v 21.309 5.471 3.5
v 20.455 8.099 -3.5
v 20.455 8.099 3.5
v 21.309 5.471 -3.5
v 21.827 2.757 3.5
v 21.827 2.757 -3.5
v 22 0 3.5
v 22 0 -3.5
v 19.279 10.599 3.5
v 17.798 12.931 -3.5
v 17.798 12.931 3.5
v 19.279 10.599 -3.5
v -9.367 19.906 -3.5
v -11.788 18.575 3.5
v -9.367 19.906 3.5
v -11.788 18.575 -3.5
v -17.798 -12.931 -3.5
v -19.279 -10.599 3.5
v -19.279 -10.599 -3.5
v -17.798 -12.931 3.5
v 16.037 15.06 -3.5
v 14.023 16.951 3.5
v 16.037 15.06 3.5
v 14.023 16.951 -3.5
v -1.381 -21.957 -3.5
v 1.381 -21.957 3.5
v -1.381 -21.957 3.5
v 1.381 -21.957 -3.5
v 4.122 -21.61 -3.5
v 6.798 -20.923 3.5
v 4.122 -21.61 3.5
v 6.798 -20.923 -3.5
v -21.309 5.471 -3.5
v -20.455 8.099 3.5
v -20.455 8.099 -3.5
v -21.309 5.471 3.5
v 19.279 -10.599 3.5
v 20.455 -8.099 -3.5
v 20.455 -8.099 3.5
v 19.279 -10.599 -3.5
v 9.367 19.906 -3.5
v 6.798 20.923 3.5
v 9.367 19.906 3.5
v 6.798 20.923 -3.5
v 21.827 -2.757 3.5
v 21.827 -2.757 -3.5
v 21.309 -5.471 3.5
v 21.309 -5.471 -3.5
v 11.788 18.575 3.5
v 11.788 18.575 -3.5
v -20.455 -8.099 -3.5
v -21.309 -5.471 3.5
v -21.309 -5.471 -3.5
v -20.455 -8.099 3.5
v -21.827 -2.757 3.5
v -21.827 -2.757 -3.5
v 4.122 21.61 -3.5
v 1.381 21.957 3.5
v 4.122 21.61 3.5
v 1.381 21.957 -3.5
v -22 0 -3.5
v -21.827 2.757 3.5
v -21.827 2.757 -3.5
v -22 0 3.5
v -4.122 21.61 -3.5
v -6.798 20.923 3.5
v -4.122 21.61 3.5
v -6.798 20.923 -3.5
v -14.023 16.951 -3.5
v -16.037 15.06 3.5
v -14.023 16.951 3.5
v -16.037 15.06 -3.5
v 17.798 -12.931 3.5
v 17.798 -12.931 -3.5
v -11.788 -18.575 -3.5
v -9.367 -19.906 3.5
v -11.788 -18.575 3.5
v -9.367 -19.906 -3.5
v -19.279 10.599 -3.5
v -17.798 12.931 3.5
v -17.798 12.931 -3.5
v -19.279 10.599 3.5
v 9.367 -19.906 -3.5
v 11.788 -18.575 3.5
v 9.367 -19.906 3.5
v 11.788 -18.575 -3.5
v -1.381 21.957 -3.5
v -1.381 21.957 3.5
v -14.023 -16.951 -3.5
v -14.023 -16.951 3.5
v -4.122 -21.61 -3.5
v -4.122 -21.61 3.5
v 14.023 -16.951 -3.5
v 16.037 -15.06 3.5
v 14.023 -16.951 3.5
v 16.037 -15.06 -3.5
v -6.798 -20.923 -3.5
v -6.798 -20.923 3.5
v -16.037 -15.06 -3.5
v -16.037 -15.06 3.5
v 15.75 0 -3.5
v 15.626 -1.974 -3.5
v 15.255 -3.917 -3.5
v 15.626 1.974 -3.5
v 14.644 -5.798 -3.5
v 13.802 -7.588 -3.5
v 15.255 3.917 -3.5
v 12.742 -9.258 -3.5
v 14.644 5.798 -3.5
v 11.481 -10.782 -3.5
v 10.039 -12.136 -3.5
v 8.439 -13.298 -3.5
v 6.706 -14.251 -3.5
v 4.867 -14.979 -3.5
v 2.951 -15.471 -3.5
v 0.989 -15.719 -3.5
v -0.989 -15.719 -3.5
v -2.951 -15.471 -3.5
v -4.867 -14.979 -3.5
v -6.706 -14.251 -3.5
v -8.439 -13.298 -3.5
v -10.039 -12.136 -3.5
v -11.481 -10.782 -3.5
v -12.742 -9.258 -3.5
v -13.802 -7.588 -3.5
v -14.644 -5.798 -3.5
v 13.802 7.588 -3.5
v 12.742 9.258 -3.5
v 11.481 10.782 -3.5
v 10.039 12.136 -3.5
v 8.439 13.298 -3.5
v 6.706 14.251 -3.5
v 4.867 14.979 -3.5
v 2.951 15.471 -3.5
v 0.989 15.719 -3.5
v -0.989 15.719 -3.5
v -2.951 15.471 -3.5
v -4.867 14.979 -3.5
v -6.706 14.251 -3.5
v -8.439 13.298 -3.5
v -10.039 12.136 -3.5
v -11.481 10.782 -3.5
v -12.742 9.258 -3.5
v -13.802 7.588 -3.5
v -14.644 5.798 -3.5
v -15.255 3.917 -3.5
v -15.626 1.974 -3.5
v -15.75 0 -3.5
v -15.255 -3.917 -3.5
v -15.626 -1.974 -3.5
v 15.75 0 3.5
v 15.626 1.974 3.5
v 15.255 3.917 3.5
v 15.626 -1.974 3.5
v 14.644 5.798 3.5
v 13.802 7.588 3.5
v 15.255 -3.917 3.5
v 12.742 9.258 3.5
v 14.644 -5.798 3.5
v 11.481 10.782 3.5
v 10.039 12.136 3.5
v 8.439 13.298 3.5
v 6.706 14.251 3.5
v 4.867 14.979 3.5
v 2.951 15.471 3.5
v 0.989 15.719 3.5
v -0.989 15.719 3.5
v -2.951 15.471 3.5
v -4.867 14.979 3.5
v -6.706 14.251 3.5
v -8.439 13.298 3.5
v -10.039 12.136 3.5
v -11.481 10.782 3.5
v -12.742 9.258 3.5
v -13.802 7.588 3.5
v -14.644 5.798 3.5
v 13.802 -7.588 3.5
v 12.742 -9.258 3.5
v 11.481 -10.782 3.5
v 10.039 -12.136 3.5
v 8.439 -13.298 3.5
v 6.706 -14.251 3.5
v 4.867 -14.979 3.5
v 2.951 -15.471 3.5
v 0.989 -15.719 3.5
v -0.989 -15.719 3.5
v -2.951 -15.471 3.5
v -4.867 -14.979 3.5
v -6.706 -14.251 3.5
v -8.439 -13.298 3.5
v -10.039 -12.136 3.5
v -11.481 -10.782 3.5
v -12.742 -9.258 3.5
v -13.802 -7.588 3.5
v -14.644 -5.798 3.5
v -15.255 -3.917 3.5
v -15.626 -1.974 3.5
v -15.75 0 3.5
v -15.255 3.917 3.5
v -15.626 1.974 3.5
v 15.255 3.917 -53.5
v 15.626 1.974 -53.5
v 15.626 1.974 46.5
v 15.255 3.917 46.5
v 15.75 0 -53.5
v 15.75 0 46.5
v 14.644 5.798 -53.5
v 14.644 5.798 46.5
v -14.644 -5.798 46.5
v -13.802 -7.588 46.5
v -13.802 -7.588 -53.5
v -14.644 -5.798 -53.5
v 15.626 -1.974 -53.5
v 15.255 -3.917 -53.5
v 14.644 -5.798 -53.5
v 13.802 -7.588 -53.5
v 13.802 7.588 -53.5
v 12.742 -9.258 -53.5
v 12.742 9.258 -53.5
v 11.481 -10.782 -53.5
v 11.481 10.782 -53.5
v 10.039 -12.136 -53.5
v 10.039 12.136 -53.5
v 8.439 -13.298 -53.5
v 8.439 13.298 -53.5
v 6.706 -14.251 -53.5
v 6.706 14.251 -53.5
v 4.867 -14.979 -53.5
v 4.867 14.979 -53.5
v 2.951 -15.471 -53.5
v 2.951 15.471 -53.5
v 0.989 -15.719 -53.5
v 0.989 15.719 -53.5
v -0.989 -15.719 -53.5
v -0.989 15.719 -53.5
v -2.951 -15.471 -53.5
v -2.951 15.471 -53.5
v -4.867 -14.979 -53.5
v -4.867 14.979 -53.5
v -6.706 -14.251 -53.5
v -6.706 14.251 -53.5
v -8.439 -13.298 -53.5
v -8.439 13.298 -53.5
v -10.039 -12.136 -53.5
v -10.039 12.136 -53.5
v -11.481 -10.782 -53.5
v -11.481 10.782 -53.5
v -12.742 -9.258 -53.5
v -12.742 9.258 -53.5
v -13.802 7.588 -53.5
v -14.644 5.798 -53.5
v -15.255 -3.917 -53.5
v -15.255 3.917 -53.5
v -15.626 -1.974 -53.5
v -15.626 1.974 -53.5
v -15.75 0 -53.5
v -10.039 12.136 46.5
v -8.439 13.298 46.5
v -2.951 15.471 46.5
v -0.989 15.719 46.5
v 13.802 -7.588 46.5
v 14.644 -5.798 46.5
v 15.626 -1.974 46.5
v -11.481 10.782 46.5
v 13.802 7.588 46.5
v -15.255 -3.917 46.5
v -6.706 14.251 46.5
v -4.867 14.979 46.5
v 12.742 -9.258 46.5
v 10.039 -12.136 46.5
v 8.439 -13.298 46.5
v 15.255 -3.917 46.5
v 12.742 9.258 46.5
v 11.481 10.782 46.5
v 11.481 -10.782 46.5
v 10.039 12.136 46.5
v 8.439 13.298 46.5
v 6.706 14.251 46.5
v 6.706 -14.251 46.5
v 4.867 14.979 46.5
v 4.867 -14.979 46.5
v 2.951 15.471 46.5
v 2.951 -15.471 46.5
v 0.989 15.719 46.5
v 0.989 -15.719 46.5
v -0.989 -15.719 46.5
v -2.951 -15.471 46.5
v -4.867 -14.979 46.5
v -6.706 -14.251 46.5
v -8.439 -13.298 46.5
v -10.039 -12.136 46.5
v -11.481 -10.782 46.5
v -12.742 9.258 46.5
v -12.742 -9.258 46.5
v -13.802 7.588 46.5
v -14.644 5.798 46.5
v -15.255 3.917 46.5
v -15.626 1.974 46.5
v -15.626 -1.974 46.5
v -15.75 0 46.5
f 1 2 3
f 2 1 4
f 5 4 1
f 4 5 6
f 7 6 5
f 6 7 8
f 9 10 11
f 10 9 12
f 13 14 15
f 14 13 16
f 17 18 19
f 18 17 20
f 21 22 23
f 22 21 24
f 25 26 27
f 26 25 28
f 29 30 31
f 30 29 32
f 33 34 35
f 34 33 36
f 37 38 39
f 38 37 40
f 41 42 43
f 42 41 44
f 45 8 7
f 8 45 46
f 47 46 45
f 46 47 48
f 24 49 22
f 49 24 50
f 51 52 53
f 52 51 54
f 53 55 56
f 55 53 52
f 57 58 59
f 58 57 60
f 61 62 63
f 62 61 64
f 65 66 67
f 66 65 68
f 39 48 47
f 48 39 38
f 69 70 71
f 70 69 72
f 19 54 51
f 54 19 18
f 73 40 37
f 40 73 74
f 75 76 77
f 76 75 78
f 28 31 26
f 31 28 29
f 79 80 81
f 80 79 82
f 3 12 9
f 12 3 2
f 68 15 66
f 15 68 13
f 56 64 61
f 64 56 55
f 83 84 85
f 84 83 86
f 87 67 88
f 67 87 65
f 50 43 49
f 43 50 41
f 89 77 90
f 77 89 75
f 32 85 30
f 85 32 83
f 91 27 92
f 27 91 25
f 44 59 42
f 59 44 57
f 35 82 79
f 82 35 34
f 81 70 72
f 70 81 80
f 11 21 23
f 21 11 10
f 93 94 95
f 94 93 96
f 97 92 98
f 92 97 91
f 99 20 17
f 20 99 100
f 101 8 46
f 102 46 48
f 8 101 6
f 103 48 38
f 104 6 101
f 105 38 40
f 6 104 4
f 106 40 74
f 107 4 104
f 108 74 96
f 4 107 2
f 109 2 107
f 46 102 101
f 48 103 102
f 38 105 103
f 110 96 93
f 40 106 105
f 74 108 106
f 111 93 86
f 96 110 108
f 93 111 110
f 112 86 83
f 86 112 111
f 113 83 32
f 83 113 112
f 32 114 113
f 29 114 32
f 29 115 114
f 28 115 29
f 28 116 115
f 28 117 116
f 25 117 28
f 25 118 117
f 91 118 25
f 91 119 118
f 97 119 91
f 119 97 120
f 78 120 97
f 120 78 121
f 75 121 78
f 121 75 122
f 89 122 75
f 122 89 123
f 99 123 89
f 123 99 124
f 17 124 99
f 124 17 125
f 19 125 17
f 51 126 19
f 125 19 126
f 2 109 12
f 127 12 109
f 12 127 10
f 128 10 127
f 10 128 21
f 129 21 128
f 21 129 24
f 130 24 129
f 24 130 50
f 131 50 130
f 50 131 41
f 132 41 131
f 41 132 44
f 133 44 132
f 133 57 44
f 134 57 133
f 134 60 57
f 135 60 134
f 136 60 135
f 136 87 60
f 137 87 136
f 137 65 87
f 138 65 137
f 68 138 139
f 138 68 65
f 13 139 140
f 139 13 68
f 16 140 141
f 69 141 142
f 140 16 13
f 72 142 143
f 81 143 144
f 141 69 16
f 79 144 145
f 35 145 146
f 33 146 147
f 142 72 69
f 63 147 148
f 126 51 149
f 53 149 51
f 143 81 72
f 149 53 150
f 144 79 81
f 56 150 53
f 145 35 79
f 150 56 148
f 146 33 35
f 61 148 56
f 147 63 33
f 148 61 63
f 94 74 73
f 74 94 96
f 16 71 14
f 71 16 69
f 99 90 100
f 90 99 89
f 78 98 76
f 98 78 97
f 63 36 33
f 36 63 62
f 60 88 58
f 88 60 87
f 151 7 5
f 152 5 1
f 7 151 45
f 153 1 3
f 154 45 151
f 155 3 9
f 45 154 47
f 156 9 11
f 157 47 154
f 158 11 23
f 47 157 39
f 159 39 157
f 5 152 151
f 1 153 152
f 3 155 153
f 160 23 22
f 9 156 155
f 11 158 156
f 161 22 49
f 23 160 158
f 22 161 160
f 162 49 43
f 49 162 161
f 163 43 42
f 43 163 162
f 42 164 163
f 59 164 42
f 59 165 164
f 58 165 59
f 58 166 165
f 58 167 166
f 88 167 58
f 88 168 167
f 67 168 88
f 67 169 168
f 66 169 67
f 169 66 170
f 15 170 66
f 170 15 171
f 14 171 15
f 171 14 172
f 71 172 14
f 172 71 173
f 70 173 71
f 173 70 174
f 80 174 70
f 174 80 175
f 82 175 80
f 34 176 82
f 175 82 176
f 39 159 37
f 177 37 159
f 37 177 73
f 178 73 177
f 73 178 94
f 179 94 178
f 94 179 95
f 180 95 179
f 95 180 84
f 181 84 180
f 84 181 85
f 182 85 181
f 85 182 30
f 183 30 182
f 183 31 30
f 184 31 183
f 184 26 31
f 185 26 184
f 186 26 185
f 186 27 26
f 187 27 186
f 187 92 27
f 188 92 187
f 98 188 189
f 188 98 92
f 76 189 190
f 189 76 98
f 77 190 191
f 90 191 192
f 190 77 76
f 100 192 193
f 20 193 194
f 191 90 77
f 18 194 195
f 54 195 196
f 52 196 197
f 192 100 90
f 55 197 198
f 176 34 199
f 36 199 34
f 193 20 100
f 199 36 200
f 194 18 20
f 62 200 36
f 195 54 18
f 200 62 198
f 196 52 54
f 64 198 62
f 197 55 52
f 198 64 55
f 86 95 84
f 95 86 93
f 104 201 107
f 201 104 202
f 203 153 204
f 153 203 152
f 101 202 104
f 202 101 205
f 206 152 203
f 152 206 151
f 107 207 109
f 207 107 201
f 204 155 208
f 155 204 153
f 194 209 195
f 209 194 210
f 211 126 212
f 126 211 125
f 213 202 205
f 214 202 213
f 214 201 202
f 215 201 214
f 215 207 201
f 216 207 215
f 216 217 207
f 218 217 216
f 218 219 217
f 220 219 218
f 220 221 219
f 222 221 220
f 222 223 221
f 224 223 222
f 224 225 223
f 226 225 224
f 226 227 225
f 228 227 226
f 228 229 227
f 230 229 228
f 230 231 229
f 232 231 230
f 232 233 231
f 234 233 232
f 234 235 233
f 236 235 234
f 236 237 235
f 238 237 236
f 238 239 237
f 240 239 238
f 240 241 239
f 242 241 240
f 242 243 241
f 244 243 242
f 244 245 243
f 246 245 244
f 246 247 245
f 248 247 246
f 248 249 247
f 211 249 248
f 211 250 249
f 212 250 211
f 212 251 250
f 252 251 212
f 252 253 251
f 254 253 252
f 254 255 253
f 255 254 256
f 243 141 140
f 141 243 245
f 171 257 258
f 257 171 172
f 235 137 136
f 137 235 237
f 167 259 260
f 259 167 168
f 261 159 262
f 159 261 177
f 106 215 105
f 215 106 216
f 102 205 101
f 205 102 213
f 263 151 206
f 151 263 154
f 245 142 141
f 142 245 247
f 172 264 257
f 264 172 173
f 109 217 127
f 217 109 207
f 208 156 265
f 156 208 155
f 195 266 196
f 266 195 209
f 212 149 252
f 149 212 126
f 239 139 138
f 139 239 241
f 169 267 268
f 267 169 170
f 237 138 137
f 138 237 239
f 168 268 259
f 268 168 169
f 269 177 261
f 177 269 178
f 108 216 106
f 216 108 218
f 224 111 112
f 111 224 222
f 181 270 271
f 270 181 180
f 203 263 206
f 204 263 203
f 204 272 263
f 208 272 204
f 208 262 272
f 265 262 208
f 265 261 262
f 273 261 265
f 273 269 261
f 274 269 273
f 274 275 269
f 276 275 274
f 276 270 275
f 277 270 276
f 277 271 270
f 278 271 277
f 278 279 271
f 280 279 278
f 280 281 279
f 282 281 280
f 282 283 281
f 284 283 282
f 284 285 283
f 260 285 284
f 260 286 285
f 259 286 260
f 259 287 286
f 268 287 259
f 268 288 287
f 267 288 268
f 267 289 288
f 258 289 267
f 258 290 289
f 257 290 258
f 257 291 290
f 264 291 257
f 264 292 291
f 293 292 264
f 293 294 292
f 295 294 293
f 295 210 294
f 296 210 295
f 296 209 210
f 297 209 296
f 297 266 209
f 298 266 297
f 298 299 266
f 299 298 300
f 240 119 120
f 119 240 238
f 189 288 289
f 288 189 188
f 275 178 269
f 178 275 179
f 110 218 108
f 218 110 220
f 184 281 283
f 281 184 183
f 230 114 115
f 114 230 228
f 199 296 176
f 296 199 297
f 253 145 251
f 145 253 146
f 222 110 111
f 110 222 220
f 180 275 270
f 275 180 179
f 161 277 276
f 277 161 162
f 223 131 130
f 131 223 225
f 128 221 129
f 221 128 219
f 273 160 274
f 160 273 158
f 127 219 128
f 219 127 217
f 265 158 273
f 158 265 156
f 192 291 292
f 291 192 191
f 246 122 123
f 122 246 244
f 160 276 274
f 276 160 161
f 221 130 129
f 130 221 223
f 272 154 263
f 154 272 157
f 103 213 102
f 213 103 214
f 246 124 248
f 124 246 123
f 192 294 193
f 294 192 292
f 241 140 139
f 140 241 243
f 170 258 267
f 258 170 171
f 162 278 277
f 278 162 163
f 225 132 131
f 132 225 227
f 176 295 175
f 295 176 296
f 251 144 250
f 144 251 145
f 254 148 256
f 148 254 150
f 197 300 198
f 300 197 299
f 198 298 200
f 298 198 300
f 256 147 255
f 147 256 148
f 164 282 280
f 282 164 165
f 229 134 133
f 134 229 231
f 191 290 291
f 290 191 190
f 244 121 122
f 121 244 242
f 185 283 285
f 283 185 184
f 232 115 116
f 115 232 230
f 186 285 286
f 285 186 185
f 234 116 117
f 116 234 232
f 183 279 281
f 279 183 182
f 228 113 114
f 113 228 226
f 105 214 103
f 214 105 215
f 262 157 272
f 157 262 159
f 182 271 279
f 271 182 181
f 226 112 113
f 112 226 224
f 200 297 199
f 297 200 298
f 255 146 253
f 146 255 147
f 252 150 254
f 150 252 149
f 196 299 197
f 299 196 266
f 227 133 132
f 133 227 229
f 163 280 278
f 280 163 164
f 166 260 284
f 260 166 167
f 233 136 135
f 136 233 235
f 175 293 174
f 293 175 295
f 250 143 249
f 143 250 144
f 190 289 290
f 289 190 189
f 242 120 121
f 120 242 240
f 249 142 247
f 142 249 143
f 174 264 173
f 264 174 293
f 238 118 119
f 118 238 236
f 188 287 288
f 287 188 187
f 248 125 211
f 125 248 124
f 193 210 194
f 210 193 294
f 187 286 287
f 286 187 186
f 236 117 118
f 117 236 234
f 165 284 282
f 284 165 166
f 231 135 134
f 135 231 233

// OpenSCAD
$fn = 50;

difference() {
	union() {
		translate(v = [0, 0, -3.5]) {
			union() {
				difference() {
					cylinder(h = 7, r = 22);
					cylinder(h = 7, r = 8);
				}
				difference() {
					translate(v = [0, 0, -50]) {
						cylinder(h = 100, r = 15.75);
					}
				}
			}
		}
	}
	union();
}
